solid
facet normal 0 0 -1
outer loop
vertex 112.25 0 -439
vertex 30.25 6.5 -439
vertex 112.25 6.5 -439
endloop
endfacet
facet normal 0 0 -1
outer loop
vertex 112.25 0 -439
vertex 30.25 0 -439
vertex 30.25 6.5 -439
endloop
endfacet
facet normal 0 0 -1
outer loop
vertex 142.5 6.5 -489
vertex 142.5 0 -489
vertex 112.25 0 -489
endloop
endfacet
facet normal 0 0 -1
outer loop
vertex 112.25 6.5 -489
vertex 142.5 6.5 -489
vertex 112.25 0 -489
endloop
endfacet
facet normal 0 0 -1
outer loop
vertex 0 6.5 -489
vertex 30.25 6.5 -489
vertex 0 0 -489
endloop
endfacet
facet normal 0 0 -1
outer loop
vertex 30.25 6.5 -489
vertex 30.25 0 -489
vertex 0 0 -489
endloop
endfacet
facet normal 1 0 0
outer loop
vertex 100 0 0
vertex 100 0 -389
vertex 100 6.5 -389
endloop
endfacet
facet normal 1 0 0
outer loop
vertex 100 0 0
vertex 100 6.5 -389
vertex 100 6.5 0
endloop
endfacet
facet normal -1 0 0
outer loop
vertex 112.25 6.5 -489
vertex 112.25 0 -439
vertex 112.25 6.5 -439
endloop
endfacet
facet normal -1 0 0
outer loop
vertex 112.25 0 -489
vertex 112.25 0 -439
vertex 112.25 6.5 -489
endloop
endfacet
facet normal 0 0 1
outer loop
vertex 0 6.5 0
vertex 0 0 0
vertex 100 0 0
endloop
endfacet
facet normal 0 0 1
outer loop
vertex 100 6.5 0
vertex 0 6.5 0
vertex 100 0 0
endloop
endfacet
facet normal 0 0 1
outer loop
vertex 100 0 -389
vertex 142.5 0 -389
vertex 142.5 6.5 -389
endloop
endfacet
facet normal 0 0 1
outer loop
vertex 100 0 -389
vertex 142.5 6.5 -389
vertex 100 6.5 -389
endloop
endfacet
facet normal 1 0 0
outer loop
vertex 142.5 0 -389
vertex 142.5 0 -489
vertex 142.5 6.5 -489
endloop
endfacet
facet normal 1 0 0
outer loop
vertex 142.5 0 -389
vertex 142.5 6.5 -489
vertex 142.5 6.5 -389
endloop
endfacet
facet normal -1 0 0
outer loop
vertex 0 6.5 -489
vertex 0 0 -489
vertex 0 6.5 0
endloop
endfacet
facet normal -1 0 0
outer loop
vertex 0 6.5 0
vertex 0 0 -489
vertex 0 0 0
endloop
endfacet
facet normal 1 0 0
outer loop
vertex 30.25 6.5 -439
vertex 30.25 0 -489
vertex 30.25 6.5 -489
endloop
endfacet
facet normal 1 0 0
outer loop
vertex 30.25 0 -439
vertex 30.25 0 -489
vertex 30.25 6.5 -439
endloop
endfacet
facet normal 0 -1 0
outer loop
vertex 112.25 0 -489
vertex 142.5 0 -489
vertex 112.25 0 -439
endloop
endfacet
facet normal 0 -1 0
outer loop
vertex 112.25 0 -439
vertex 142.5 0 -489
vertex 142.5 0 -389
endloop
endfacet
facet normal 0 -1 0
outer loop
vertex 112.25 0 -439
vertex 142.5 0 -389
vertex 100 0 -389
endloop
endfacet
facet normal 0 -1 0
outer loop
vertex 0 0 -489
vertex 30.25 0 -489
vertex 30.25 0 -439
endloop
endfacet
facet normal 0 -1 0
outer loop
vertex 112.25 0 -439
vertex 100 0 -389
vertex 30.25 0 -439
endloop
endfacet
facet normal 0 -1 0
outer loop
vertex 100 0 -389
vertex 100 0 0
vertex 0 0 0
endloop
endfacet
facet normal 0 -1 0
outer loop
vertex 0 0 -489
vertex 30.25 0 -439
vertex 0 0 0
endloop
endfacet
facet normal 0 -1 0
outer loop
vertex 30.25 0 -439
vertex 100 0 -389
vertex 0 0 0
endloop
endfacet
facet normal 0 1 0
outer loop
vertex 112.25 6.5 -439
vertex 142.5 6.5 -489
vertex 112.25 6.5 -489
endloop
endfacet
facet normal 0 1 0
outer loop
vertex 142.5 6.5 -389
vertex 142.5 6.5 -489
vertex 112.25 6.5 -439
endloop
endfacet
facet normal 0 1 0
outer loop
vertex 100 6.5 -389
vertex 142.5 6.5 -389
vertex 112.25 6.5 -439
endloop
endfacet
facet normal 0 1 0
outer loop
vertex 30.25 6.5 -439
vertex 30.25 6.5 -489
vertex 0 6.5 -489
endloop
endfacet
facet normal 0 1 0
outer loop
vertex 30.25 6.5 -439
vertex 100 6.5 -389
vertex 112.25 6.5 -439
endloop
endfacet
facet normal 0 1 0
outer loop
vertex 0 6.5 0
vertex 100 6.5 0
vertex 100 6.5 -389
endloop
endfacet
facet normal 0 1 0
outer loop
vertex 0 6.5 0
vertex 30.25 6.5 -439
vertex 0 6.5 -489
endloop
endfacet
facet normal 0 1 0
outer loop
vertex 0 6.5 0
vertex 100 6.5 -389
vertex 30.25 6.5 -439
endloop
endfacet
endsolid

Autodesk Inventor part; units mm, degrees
ref_plane "YZ Plane" through (0, 0, 0) normal (1, 0, 0) x (0, 1, 0)
ref_plane "XZ Plane" through (0, 0, 0) normal (0, 1, 0) x (-1, 0, 0)
ref_plane "XY Plane" through (0, 0, 0) normal (0, 0, 1) x (1, 0, 0)
sketch "Sketch1" plane through (0, 0, 0) normal (0, 1, 0) x (-1, 0, 0)
  line L0 (0, 0) -> (-100, 0)
  line L1 (0, -489) -> (0, 0)
  line L2 (-30.25, -489) -> (-30.25, -439)
  line L3 (-30.25, -439) -> (-112.25, -439)
  line L4 (-112.25, -439) -> (-112.25, -489)
  line L5 (-142.5, -489) -> (-112.25, -489)
  line L6 (-30.25, -489) -> (0, -489)
  line L7 (-142.5, -489) -> (-142.5, -389)
  line L8 (-142.5, -389) -> (-100, -389)
  line L9 (-100, -389) -> (-100, 0)
  dimension "d0" = 82
  dimension "d1" = 100
  dimension "d2" = 489
  dimension "d3" = 30.25
  dimension "d4" = 50
  dimension "d5" = 50
extrude "Extrusion1" add sketch "Sketch1" along normal blind 6.5
properties part number "inner_brace_left"
